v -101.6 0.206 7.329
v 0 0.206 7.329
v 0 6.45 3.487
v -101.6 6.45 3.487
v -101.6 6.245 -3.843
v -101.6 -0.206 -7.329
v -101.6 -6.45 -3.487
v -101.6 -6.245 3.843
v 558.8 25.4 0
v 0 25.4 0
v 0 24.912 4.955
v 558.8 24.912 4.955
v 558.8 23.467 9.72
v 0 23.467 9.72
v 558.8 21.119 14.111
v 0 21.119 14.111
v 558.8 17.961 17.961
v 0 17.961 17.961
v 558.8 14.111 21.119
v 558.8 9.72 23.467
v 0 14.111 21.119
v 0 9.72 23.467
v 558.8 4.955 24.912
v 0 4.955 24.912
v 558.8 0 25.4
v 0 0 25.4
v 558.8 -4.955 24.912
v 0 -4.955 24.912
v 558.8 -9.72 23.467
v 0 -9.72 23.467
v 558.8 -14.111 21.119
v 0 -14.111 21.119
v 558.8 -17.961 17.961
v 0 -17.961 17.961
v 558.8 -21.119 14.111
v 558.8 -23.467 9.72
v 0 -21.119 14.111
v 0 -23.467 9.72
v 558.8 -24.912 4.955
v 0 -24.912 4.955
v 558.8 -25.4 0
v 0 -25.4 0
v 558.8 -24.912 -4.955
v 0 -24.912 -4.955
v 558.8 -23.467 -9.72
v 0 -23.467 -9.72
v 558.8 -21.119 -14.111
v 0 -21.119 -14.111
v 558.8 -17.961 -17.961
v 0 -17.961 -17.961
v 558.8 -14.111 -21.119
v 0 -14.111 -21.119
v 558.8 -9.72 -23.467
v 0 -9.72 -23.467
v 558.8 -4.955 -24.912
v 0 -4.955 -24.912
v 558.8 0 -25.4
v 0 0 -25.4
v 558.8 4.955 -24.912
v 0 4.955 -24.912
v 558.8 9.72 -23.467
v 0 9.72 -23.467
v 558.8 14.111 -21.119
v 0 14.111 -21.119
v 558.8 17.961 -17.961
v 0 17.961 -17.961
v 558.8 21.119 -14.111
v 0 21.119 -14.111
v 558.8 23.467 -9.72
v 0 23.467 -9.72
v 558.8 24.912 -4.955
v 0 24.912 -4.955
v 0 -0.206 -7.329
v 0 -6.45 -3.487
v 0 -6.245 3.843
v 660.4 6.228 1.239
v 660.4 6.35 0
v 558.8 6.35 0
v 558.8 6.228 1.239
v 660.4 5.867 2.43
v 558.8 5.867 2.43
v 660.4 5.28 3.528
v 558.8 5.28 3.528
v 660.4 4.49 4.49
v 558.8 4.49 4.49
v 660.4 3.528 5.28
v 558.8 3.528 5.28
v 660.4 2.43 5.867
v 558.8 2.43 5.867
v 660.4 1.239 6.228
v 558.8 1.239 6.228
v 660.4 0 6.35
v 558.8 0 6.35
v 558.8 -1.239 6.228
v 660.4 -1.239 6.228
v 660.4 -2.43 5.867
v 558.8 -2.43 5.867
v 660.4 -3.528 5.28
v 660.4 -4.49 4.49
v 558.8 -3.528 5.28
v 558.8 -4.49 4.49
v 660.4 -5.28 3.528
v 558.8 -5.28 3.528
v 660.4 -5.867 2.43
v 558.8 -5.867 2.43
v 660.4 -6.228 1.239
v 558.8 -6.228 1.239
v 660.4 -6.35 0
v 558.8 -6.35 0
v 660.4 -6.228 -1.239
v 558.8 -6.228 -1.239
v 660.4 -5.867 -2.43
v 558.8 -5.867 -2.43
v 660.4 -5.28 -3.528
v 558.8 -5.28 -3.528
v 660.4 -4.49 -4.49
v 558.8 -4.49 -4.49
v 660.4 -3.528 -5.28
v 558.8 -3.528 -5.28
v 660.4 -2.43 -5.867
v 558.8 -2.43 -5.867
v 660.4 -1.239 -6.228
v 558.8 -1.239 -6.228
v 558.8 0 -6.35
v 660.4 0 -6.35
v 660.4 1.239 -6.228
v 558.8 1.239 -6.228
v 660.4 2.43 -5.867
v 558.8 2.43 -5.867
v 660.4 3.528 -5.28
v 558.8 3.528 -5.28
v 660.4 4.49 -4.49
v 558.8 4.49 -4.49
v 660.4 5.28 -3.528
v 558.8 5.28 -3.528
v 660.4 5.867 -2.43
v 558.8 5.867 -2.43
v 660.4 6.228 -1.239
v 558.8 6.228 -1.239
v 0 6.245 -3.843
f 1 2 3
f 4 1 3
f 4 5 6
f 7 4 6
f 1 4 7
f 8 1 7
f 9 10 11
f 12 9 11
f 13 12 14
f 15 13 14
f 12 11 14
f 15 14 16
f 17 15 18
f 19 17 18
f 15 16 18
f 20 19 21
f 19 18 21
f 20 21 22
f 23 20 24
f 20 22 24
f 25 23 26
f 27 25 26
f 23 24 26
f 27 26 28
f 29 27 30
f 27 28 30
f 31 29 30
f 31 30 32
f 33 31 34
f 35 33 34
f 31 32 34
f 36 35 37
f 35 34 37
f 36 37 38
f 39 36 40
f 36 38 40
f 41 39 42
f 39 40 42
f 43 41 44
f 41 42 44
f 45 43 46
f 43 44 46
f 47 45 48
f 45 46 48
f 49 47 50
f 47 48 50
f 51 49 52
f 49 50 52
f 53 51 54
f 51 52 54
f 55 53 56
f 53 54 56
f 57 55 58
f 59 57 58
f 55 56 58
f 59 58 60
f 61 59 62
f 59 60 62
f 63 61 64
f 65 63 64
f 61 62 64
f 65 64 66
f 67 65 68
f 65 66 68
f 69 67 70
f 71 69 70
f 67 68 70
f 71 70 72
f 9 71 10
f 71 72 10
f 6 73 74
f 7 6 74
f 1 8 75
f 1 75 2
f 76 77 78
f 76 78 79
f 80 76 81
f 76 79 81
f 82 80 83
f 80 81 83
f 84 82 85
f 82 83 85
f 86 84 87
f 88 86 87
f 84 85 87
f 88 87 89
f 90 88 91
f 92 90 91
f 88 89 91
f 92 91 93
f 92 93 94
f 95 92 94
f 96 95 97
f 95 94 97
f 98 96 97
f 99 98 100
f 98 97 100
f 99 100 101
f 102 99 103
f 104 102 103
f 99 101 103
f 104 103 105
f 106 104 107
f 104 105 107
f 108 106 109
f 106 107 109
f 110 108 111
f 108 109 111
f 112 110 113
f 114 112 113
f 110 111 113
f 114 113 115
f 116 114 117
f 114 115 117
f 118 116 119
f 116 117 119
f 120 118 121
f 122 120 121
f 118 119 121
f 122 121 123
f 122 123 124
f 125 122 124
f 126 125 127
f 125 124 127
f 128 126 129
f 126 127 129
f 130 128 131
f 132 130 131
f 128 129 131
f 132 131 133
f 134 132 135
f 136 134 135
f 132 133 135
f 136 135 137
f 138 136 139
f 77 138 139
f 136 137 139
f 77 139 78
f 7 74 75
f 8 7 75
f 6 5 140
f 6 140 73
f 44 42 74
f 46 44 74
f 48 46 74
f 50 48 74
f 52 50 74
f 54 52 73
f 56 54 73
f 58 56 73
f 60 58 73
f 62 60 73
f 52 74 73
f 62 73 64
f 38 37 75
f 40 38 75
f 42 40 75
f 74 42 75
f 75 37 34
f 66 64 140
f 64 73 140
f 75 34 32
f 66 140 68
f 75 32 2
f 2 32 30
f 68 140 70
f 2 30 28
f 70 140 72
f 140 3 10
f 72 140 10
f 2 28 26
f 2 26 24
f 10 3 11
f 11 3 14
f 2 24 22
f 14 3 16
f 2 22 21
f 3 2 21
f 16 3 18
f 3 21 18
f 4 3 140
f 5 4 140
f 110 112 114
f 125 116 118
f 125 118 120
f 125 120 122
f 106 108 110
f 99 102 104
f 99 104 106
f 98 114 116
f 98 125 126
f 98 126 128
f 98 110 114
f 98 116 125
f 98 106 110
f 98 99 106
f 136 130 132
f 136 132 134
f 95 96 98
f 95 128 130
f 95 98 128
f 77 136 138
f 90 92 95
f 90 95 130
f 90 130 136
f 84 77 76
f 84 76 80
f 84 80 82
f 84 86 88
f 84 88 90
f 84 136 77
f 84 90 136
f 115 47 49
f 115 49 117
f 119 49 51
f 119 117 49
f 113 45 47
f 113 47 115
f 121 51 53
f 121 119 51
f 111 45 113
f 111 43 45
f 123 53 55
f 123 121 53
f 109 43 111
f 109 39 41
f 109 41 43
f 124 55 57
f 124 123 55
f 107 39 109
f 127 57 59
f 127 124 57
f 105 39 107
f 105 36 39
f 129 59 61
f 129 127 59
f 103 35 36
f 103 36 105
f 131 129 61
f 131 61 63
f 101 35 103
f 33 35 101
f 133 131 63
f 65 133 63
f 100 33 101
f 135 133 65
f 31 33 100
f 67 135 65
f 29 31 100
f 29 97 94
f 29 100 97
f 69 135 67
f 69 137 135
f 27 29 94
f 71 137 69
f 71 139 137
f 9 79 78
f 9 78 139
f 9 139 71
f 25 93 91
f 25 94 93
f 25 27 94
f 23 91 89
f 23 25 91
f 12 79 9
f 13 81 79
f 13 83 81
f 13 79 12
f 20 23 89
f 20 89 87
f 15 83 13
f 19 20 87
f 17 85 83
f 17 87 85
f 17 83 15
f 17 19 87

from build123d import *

# Parameters (mm, degrees)
F0_R     = 25.4
F1_DEPTH = 558.8
F2_R     = 6.35
F3_DEPTH = 101.6
F5_DEPTH = 101.6


with BuildPart() as f1:
    # F0 (on Right) → F1 (new body)
    with BuildSketch(Plane.YZ):
        Circle(F0_R)
    extrude(amount=F1_DEPTH)

    # F2 (on face) → F3 (join)
    with BuildSketch(Plane.YZ.offset(558.8)):
        Circle(F2_R)
    extrude(amount=F3_DEPTH)

    # F4 (on face) → F5 (join)
    with BuildSketch(Plane(origin=(0, 0, 0), x_dir=(0, -1, 0), z_dir=(-1, 0, 0))):
        Polygon((0.205691, -7.329463), (6.450346, -3.486598), (6.244656, 3.842865), (-0.205691, 7.329463), (-6.450346, 3.486598), (-6.244656, -3.842865), align=None)
    extrude(amount=F5_DEPTH)


solid = f1.part
